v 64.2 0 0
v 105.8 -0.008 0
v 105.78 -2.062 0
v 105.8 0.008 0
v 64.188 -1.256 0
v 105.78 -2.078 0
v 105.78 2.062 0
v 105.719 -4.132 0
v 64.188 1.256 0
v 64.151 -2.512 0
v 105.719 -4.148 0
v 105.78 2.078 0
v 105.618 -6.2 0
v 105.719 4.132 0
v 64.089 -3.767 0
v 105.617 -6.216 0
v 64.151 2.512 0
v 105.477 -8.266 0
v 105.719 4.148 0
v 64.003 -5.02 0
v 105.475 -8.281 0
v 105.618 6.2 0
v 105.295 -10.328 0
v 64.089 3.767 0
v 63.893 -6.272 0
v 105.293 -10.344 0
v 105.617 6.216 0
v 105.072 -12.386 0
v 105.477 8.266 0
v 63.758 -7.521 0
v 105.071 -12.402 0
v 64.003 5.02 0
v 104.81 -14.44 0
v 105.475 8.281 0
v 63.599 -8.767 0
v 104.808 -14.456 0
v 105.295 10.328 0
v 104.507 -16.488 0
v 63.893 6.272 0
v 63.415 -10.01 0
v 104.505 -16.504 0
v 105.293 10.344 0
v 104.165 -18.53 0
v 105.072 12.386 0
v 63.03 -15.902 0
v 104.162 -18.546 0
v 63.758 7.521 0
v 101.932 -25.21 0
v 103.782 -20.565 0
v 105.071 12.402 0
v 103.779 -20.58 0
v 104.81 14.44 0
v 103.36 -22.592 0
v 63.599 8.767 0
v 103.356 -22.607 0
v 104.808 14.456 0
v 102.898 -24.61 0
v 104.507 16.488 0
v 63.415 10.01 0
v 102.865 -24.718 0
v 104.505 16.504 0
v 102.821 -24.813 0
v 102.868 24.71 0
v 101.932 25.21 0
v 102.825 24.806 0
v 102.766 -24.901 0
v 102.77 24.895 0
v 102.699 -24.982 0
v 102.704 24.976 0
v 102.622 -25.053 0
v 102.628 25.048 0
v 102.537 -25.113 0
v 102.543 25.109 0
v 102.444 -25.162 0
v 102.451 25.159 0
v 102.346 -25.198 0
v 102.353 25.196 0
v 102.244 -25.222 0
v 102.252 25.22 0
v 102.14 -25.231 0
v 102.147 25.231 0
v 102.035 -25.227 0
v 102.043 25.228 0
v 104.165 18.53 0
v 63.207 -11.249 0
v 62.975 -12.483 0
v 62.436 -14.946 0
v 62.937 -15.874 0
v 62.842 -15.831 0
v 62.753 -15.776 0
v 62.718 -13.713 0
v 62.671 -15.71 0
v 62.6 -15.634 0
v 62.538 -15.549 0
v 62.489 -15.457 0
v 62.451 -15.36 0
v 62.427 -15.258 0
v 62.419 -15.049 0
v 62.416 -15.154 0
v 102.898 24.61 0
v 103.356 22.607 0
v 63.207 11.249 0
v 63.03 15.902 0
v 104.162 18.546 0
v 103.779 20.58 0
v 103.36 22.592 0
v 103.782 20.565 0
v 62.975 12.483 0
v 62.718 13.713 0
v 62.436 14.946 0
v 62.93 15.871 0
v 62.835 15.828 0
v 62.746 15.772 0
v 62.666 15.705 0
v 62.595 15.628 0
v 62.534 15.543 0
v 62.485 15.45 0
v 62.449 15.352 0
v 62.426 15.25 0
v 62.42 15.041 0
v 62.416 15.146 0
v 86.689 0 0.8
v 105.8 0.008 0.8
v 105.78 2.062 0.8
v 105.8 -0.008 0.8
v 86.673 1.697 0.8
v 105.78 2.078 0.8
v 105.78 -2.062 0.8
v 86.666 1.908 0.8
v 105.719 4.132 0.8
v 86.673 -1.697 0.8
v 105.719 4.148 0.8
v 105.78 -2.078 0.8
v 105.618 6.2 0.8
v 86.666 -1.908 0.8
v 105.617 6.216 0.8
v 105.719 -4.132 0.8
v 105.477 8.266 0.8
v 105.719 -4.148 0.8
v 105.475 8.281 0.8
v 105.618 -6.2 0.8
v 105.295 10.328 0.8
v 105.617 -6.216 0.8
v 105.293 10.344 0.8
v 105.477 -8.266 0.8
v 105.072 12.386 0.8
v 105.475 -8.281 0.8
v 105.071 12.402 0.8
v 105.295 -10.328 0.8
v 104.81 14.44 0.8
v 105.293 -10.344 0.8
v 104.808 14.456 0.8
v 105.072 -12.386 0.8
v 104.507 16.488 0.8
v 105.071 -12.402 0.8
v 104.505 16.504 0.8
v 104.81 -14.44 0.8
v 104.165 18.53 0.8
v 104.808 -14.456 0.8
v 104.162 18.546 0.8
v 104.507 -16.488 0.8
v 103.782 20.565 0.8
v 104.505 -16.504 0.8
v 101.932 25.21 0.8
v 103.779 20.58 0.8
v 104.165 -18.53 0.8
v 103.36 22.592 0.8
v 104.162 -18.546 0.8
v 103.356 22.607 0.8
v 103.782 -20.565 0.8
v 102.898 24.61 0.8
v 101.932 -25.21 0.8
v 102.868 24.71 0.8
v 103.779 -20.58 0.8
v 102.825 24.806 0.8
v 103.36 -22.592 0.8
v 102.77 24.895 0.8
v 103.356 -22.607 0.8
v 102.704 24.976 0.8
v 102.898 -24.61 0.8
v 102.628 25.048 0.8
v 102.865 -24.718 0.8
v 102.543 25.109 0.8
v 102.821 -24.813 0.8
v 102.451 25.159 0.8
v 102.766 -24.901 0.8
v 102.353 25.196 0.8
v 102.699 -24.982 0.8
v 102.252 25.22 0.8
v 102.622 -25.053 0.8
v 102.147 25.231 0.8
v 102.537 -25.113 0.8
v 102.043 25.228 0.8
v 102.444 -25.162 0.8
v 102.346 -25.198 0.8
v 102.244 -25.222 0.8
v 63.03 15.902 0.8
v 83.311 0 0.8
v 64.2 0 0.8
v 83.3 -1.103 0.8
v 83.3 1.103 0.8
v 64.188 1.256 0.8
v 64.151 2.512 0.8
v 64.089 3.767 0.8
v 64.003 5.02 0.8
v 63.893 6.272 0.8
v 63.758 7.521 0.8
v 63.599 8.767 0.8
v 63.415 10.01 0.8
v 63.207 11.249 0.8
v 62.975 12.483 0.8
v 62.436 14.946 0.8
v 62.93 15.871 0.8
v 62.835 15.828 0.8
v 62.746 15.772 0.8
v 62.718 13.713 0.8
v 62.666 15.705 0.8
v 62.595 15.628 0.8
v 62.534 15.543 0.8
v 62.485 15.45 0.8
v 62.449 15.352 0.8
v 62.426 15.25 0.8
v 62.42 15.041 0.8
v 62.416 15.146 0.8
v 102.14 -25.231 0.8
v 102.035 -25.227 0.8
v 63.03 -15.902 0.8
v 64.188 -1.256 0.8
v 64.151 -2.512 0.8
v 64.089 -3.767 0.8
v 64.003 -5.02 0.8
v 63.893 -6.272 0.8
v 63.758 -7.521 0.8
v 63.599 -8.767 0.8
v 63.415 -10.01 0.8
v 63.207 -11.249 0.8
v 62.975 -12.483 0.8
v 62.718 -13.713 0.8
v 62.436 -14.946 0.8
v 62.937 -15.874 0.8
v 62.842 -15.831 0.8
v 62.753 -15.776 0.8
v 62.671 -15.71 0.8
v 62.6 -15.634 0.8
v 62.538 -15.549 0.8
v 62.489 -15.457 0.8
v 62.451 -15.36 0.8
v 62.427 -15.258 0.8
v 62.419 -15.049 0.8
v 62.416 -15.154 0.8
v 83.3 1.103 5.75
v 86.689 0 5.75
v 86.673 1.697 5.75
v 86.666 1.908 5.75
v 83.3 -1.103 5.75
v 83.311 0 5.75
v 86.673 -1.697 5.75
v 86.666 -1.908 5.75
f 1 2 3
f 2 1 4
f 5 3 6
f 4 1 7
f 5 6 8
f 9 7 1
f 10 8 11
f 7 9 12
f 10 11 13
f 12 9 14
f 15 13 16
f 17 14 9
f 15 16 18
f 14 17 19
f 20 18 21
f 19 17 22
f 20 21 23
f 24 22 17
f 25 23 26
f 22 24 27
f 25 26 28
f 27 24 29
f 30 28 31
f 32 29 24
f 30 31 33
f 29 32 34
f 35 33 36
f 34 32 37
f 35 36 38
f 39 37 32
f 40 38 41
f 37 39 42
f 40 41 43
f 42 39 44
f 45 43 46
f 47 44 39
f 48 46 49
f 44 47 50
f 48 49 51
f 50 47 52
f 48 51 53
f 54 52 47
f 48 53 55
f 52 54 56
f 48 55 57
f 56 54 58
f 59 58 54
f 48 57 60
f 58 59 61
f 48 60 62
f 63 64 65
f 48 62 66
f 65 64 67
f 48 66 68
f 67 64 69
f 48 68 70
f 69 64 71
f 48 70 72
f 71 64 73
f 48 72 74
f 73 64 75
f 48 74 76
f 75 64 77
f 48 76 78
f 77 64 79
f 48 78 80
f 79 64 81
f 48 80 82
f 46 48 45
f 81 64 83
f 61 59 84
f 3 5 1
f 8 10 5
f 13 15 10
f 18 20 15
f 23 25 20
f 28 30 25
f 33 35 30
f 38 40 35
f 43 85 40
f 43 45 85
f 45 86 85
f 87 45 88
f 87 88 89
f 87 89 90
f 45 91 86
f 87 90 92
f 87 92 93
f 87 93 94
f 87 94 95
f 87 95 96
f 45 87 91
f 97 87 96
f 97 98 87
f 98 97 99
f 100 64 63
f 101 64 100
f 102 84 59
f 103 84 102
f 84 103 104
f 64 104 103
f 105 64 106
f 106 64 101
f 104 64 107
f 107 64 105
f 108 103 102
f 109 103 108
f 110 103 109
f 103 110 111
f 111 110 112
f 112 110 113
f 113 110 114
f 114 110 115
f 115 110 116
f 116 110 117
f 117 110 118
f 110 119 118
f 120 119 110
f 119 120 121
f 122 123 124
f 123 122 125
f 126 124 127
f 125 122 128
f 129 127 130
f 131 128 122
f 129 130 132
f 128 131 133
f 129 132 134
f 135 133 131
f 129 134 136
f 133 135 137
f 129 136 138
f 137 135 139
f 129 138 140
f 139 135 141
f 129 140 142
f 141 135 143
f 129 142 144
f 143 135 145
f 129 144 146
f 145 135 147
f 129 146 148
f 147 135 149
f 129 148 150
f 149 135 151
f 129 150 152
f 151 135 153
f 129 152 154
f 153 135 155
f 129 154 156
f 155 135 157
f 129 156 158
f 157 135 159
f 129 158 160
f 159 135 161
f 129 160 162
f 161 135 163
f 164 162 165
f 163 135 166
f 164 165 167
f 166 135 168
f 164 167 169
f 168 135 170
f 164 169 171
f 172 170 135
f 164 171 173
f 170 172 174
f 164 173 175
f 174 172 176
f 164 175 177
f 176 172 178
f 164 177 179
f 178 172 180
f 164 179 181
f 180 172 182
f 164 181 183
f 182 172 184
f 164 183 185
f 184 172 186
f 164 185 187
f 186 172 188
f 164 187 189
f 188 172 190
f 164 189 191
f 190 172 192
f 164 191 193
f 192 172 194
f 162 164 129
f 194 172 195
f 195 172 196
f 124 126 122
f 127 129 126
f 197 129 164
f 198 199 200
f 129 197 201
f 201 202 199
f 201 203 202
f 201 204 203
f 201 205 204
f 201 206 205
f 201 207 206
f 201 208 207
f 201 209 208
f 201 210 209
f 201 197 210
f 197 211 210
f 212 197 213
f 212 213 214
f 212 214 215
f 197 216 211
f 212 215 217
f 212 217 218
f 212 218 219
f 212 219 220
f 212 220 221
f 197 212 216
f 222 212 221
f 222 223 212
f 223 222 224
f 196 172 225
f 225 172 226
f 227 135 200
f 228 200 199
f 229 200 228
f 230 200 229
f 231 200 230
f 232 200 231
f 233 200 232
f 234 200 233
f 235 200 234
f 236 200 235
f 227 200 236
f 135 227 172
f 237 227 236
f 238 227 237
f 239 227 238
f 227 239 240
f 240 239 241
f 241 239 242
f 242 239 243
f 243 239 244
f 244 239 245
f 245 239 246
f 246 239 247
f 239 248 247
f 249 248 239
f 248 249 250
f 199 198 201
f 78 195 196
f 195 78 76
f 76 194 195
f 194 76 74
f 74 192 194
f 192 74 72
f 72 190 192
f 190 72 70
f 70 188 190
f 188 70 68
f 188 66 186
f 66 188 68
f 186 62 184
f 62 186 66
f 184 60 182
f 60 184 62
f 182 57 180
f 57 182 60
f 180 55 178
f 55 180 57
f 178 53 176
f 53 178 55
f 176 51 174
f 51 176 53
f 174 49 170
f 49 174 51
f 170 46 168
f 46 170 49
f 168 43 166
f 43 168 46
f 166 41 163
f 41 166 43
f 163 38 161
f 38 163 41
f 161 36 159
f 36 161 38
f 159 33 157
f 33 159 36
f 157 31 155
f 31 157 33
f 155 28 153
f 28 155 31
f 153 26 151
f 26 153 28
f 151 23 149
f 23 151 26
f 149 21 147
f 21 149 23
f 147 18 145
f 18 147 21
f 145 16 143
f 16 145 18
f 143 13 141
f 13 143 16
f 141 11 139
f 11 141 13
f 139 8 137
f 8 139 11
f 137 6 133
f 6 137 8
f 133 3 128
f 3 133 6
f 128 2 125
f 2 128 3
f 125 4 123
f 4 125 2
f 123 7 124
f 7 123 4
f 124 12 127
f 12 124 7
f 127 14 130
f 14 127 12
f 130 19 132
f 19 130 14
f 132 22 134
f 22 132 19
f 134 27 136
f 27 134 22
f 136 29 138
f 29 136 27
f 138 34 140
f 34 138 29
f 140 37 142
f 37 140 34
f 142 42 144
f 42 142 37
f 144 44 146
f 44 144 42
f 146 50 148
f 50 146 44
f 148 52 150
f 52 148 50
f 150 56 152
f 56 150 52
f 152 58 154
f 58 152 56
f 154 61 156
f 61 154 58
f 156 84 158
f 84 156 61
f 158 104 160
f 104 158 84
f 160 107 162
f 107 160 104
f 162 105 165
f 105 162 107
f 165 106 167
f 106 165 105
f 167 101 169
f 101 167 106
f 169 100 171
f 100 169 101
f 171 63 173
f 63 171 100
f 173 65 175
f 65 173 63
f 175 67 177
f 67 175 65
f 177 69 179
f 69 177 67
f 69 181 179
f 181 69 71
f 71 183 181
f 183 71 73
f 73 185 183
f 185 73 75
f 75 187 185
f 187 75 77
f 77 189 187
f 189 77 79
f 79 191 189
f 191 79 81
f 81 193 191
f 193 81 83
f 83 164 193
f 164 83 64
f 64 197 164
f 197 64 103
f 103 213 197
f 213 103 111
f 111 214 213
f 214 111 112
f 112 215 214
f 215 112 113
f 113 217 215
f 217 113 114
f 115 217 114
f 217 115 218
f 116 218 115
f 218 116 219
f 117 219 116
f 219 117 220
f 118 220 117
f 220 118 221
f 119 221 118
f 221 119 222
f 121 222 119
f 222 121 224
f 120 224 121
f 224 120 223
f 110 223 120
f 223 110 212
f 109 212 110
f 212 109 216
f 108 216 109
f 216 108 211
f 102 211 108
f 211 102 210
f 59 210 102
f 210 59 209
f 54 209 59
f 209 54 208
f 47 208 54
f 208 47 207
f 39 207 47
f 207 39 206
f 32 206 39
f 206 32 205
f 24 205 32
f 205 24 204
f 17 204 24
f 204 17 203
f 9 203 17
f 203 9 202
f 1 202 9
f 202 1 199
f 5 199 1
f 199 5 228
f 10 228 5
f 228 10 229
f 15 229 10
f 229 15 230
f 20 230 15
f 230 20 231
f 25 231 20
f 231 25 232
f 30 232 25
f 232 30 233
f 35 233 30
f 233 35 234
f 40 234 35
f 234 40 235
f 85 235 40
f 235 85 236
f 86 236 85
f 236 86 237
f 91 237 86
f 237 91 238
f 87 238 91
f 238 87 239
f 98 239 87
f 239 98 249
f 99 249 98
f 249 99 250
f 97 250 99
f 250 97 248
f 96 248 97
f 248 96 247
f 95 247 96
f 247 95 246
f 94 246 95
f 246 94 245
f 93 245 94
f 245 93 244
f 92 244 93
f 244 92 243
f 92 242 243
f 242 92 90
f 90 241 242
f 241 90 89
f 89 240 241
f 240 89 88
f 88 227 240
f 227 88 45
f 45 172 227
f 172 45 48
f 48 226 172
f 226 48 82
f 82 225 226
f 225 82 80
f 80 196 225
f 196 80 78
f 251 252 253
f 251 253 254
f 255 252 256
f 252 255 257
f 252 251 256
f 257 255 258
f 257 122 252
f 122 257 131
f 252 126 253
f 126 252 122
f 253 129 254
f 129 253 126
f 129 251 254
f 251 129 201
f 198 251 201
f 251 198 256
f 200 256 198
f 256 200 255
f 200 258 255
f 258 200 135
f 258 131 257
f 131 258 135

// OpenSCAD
// file: parameters.scad
// =============================================================================
// Gen-CD — nightly 2026-10-14 (physics_scorer, honest magpylib watts)
// Push past Gen-CA on the same arc-nested one-plate architecture: poles out to R86, bobbins r65–105 × 4.95 mm copper. Full-resolution scorer picks this window at ≈8.56 W (386 m, at the wire budget) with a Ø229 stator that still packs; thinner-copper R86 tips (r65–107 × 4.65) need Ø232+ and would not pack. Same 8 bolt-on arcs/rotor + D-flat hub + open-centre stator + in-place bobbin bases that unlocked Gen-CA.
// Clocking 0 deg (magnets N facing S) + D-flat keyed bore + index notch + flip-symmetric hole map.
// Windable 2-piece bobbin; turns = physics_scorer turns_fit; copper only between flanges.
// Steel back-iron: 2× Ø198 × 4.76 mm (3/16") mild-steel discs (steel_backiron_disc.dxf); magnets sit ON the steel
// (through-pockets) -> score with --back-iron. Night 2026-10-14.
// =============================================================================
topology            = "dual_rotor";

// --- Wire / winding (physics_scorer winding-fit) -------------------------------
wire_awg            = 26;
wire_od             = 0.45;     // insulated OD mm (bare 0.405)
fill_realistic      = 0.65;     // insulated-wire area / window (DENSE layered wind with a jig; scorer cap 0.65)
turns               = 370;       // = physics_scorer turns_fit (do NOT raise)
coil_former_type    = "bobbin";
coil_core_inset     = 18.31;     // radial copper build: hub = copper boundary inset by this
wind_build_axial    = 0.0;      // nothing proud of the flanges
wind_build_radial   = 0.0;

// --- Bobbin (base + lid) ---------------------------------------------------------
coil_id_r           = 65.00;    // copper boundary sector
coil_od_r           = 105.00;
span_deg            = 26.91;    // = pitch - 2*asin((wall+0.85)/coil_id_r) -> >=1.2 mm stator web
former_web          = 4.95;     // copper height between flanges (TALL copper: steel keeps Bz up)
flange_t            = 0.80;     // >= 0.8 mm FDM wall rule (tall winds push on the flanges)
wall                = 0.80;     // flange lip beyond copper
former_bare_h       = former_web + 2 * flange_t;
coil_envelope_h     = former_bare_h + 2 * wind_build_axial;
tab_w               = 7.0;
tab_len             = 7.0;
tab_h               = former_bare_h / 2;
pin_d               = 1.9;      // 1.75 mm filament locating pin
coil_mount_r        = coil_od_r + 0.2 + 4.0;
lead_y              = 1.6;
lead_slot_w         = 0.9;
lead_groove_d       = 0.6;

// --- Gap -------------------------------------------------------------------------
run_clear           = 0.50;     // rotor face -> flange
gap_spacer_h        = run_clear + wind_build_axial;
m2m                 = coil_envelope_h + 2 * run_clear;   // rotor face to rotor face (= gap_sleeve length)

// --- Stator ----------------------------------------------------------------------
coil_stations       = 12;
bay_clear           = 0.35;     // 0.35 mm: bobbin BASES print IN PLACE inside the stator bays (print-in-place gap), then pop out
stator_thick        = former_bare_h;                        // bobbins flush both faces
stator_od           = 229.0;
shaft_clear_stator  = 14.0;     // stator is static; gap sleeve OD 12 spins inside
stator_ir           = 59.85;    // ANNULAR stator: open centre (nested one-plate pack); inner rim 4.0 mm

// --- Rotor(s) --------------------------------------------------------------------
magnet_Br           = 1.43;     // N52
magnet_d_large      = 20.0;
magnet_h_large      = 5.0;      // one O20x5 per pocket
magnet_h_small      = 5.0;      // unused: no O5 pockets in this kit
halbach_magnetisation = "none";  // NO O5 assist magnets in this kit (scan: they lower the 4-pole score)
rotor_b_same_axis   = true;     // same-index magnets share one axis: N faces S across the gap
large_pocket_d      = 20.3;
small_pocket_d      = 5.3;
pocket_h            = 5.00;     // THROUGH the carrier: magnet back face sits on the steel disc (FLUSH seat: carrier = magnet height, magnet face level with the rotor face)
large_n             = 8;
R_large             = 86.0;
small_r_list        = [];       // no O5 pockets
carrier_od          = 198.0;
ring_ir             = 72.85;    // RING rotor: PLA magnet ring r ring_ir..carrier_od/2 (steel disc = structural rotor)
hub_flange_od       = 74.0;     // separate rotor_hub flange (inside the ring, flush with the ring face)
csk_d               = 6.6;      // M3 countersunk head pocket (ISO 10642 head 6.0 nominal) on the stator face
csk_depth           = 1.55;     // = (csk_d - m3_clear) / 2: 90 deg cone; head sits 0.3 mm below the face
n_seg               = 8;        // magnet-carrier ARCS per rotor (segmented carrier)
seg_deg             = 360 / n_seg;
seg_start           = -22.5;   // arc edge angle (between pocket 0 and its clamp bolt)
seg_kerf_deg        = 0.4;      // gap between neighbouring arcs on the steel
carrier_thick       = pocket_h;
hub_h               = 12.0;     // > steel_t + insert: radial set-screw clears the steel
hub_od              = 24.0;     // slim hub so the M4 brace rods fit at R~18 inside the coil ring
hub_insert_d        = 4.0;      // M3 heat-set insert, radial, bears on the D-flat
rotor_b_offset_deg  = 0.0;      // CLOCKING: magnets directly opposite
shaft_key           = "dflat";
dflat_depth         = 0.5;      // 8 mm shaft with 0.5 mm flat (7.5 across flat)
index_notch_d       = 3.0;

// --- Steel back-iron (buyable laser-cut) -------------------------------------------
steel_t             = 4.76;      // mild steel thickness (image method ignores it; sized from steel_flux.py so the return path stays well below saturation)
steel_center_hole   = 26.0;     // slips over the rotor hub (OD 24)
steel_od            = carrier_od;   // steel disc OD = rotor carrier OD

// --- Modular MAX interface ----------------------------------------------------------
shaft_bore          = 8.35;
dflat_x             = 4.0 - dflat_depth + (shaft_bore - 8.0) / 2;
bearing_d           = 21.85;
bearing_h           = 7.2;
m3_clear            = 3.5;
bolt_r_inner        = 30.0;     // M3 steel-disc clamp bolts (inside the magnet ring)
bolt_n_inner        = 4;
bolt_inner_angles   = [0, 90, 180, 270];
bolt_r_outer        = 86.0;     // second M3 steel-disc clamp ring
bolt_outer_angles   = [22.5, 67.5, 112.5, 157.5, 202.5, 247.5, 292.5, 337.5];
flange_bolt_r       = 109.5;     // frame rods: OUTSIDE the rotor OD (rotors spin inside them)
flange_bolt_n       = 4;
flange_bolt_offset  = 45.00;    // between coil stations -> never cuts a lead groove/tab
brace_r             = 18.0;
brace_d             = 4.3;      // temporary M4 jack rods (assembly only)
brace_n             = 4;
brace_angles        = [45, 135, 225, 315];          // flip-symmetric

spacer_pad_od       = 14.0;
spacer_pad_id       = m3_clear;
endbell_od          = 229.0;
endbell_thick       = 8.0;
endbell_shaft_clear = 10.0;
collar_h            = 10.0;
standoff_od         = 9.0;
frame_standoff_h    = run_clear + carrier_thick + hub_h + collar_h + 2.0;
sleeve_od           = 12.0;
plate_max_mm        = 410;

$fn = 64;
// main file
// Gen-CD — bobbin BASE (bottom flange + hub). Print x12, flange down. Wind 26 AWG x 370 t around
// the hub with the LID glued on (coil_lid.stl). Copper lives ONLY between the flanges (no proud winds).
include <parameters.scad>;
$fn = 48;
module sector_2d(r_in, r_out, ang) {
    polygon([
        for (a = [-ang/2 : ang/24 : ang/2]) [r_in*cos(a), r_in*sin(a)],
        for (a = [ang/2 : -ang/24 : -ang/2]) [r_out*cos(a), r_out*sin(a)]
    ]);
}
module footprint_2d() { offset(r=wall) sector_2d(coil_id_r, coil_od_r, span_deg); }
module hub_2d()       { offset(delta=-coil_core_inset) sector_2d(coil_id_r, coil_od_r, span_deg); }

union() {
    linear_extrude(flange_t) footprint_2d();
    translate([0, 0, flange_t - 0.01]) linear_extrude(former_web + 0.01) hub_2d();
}
